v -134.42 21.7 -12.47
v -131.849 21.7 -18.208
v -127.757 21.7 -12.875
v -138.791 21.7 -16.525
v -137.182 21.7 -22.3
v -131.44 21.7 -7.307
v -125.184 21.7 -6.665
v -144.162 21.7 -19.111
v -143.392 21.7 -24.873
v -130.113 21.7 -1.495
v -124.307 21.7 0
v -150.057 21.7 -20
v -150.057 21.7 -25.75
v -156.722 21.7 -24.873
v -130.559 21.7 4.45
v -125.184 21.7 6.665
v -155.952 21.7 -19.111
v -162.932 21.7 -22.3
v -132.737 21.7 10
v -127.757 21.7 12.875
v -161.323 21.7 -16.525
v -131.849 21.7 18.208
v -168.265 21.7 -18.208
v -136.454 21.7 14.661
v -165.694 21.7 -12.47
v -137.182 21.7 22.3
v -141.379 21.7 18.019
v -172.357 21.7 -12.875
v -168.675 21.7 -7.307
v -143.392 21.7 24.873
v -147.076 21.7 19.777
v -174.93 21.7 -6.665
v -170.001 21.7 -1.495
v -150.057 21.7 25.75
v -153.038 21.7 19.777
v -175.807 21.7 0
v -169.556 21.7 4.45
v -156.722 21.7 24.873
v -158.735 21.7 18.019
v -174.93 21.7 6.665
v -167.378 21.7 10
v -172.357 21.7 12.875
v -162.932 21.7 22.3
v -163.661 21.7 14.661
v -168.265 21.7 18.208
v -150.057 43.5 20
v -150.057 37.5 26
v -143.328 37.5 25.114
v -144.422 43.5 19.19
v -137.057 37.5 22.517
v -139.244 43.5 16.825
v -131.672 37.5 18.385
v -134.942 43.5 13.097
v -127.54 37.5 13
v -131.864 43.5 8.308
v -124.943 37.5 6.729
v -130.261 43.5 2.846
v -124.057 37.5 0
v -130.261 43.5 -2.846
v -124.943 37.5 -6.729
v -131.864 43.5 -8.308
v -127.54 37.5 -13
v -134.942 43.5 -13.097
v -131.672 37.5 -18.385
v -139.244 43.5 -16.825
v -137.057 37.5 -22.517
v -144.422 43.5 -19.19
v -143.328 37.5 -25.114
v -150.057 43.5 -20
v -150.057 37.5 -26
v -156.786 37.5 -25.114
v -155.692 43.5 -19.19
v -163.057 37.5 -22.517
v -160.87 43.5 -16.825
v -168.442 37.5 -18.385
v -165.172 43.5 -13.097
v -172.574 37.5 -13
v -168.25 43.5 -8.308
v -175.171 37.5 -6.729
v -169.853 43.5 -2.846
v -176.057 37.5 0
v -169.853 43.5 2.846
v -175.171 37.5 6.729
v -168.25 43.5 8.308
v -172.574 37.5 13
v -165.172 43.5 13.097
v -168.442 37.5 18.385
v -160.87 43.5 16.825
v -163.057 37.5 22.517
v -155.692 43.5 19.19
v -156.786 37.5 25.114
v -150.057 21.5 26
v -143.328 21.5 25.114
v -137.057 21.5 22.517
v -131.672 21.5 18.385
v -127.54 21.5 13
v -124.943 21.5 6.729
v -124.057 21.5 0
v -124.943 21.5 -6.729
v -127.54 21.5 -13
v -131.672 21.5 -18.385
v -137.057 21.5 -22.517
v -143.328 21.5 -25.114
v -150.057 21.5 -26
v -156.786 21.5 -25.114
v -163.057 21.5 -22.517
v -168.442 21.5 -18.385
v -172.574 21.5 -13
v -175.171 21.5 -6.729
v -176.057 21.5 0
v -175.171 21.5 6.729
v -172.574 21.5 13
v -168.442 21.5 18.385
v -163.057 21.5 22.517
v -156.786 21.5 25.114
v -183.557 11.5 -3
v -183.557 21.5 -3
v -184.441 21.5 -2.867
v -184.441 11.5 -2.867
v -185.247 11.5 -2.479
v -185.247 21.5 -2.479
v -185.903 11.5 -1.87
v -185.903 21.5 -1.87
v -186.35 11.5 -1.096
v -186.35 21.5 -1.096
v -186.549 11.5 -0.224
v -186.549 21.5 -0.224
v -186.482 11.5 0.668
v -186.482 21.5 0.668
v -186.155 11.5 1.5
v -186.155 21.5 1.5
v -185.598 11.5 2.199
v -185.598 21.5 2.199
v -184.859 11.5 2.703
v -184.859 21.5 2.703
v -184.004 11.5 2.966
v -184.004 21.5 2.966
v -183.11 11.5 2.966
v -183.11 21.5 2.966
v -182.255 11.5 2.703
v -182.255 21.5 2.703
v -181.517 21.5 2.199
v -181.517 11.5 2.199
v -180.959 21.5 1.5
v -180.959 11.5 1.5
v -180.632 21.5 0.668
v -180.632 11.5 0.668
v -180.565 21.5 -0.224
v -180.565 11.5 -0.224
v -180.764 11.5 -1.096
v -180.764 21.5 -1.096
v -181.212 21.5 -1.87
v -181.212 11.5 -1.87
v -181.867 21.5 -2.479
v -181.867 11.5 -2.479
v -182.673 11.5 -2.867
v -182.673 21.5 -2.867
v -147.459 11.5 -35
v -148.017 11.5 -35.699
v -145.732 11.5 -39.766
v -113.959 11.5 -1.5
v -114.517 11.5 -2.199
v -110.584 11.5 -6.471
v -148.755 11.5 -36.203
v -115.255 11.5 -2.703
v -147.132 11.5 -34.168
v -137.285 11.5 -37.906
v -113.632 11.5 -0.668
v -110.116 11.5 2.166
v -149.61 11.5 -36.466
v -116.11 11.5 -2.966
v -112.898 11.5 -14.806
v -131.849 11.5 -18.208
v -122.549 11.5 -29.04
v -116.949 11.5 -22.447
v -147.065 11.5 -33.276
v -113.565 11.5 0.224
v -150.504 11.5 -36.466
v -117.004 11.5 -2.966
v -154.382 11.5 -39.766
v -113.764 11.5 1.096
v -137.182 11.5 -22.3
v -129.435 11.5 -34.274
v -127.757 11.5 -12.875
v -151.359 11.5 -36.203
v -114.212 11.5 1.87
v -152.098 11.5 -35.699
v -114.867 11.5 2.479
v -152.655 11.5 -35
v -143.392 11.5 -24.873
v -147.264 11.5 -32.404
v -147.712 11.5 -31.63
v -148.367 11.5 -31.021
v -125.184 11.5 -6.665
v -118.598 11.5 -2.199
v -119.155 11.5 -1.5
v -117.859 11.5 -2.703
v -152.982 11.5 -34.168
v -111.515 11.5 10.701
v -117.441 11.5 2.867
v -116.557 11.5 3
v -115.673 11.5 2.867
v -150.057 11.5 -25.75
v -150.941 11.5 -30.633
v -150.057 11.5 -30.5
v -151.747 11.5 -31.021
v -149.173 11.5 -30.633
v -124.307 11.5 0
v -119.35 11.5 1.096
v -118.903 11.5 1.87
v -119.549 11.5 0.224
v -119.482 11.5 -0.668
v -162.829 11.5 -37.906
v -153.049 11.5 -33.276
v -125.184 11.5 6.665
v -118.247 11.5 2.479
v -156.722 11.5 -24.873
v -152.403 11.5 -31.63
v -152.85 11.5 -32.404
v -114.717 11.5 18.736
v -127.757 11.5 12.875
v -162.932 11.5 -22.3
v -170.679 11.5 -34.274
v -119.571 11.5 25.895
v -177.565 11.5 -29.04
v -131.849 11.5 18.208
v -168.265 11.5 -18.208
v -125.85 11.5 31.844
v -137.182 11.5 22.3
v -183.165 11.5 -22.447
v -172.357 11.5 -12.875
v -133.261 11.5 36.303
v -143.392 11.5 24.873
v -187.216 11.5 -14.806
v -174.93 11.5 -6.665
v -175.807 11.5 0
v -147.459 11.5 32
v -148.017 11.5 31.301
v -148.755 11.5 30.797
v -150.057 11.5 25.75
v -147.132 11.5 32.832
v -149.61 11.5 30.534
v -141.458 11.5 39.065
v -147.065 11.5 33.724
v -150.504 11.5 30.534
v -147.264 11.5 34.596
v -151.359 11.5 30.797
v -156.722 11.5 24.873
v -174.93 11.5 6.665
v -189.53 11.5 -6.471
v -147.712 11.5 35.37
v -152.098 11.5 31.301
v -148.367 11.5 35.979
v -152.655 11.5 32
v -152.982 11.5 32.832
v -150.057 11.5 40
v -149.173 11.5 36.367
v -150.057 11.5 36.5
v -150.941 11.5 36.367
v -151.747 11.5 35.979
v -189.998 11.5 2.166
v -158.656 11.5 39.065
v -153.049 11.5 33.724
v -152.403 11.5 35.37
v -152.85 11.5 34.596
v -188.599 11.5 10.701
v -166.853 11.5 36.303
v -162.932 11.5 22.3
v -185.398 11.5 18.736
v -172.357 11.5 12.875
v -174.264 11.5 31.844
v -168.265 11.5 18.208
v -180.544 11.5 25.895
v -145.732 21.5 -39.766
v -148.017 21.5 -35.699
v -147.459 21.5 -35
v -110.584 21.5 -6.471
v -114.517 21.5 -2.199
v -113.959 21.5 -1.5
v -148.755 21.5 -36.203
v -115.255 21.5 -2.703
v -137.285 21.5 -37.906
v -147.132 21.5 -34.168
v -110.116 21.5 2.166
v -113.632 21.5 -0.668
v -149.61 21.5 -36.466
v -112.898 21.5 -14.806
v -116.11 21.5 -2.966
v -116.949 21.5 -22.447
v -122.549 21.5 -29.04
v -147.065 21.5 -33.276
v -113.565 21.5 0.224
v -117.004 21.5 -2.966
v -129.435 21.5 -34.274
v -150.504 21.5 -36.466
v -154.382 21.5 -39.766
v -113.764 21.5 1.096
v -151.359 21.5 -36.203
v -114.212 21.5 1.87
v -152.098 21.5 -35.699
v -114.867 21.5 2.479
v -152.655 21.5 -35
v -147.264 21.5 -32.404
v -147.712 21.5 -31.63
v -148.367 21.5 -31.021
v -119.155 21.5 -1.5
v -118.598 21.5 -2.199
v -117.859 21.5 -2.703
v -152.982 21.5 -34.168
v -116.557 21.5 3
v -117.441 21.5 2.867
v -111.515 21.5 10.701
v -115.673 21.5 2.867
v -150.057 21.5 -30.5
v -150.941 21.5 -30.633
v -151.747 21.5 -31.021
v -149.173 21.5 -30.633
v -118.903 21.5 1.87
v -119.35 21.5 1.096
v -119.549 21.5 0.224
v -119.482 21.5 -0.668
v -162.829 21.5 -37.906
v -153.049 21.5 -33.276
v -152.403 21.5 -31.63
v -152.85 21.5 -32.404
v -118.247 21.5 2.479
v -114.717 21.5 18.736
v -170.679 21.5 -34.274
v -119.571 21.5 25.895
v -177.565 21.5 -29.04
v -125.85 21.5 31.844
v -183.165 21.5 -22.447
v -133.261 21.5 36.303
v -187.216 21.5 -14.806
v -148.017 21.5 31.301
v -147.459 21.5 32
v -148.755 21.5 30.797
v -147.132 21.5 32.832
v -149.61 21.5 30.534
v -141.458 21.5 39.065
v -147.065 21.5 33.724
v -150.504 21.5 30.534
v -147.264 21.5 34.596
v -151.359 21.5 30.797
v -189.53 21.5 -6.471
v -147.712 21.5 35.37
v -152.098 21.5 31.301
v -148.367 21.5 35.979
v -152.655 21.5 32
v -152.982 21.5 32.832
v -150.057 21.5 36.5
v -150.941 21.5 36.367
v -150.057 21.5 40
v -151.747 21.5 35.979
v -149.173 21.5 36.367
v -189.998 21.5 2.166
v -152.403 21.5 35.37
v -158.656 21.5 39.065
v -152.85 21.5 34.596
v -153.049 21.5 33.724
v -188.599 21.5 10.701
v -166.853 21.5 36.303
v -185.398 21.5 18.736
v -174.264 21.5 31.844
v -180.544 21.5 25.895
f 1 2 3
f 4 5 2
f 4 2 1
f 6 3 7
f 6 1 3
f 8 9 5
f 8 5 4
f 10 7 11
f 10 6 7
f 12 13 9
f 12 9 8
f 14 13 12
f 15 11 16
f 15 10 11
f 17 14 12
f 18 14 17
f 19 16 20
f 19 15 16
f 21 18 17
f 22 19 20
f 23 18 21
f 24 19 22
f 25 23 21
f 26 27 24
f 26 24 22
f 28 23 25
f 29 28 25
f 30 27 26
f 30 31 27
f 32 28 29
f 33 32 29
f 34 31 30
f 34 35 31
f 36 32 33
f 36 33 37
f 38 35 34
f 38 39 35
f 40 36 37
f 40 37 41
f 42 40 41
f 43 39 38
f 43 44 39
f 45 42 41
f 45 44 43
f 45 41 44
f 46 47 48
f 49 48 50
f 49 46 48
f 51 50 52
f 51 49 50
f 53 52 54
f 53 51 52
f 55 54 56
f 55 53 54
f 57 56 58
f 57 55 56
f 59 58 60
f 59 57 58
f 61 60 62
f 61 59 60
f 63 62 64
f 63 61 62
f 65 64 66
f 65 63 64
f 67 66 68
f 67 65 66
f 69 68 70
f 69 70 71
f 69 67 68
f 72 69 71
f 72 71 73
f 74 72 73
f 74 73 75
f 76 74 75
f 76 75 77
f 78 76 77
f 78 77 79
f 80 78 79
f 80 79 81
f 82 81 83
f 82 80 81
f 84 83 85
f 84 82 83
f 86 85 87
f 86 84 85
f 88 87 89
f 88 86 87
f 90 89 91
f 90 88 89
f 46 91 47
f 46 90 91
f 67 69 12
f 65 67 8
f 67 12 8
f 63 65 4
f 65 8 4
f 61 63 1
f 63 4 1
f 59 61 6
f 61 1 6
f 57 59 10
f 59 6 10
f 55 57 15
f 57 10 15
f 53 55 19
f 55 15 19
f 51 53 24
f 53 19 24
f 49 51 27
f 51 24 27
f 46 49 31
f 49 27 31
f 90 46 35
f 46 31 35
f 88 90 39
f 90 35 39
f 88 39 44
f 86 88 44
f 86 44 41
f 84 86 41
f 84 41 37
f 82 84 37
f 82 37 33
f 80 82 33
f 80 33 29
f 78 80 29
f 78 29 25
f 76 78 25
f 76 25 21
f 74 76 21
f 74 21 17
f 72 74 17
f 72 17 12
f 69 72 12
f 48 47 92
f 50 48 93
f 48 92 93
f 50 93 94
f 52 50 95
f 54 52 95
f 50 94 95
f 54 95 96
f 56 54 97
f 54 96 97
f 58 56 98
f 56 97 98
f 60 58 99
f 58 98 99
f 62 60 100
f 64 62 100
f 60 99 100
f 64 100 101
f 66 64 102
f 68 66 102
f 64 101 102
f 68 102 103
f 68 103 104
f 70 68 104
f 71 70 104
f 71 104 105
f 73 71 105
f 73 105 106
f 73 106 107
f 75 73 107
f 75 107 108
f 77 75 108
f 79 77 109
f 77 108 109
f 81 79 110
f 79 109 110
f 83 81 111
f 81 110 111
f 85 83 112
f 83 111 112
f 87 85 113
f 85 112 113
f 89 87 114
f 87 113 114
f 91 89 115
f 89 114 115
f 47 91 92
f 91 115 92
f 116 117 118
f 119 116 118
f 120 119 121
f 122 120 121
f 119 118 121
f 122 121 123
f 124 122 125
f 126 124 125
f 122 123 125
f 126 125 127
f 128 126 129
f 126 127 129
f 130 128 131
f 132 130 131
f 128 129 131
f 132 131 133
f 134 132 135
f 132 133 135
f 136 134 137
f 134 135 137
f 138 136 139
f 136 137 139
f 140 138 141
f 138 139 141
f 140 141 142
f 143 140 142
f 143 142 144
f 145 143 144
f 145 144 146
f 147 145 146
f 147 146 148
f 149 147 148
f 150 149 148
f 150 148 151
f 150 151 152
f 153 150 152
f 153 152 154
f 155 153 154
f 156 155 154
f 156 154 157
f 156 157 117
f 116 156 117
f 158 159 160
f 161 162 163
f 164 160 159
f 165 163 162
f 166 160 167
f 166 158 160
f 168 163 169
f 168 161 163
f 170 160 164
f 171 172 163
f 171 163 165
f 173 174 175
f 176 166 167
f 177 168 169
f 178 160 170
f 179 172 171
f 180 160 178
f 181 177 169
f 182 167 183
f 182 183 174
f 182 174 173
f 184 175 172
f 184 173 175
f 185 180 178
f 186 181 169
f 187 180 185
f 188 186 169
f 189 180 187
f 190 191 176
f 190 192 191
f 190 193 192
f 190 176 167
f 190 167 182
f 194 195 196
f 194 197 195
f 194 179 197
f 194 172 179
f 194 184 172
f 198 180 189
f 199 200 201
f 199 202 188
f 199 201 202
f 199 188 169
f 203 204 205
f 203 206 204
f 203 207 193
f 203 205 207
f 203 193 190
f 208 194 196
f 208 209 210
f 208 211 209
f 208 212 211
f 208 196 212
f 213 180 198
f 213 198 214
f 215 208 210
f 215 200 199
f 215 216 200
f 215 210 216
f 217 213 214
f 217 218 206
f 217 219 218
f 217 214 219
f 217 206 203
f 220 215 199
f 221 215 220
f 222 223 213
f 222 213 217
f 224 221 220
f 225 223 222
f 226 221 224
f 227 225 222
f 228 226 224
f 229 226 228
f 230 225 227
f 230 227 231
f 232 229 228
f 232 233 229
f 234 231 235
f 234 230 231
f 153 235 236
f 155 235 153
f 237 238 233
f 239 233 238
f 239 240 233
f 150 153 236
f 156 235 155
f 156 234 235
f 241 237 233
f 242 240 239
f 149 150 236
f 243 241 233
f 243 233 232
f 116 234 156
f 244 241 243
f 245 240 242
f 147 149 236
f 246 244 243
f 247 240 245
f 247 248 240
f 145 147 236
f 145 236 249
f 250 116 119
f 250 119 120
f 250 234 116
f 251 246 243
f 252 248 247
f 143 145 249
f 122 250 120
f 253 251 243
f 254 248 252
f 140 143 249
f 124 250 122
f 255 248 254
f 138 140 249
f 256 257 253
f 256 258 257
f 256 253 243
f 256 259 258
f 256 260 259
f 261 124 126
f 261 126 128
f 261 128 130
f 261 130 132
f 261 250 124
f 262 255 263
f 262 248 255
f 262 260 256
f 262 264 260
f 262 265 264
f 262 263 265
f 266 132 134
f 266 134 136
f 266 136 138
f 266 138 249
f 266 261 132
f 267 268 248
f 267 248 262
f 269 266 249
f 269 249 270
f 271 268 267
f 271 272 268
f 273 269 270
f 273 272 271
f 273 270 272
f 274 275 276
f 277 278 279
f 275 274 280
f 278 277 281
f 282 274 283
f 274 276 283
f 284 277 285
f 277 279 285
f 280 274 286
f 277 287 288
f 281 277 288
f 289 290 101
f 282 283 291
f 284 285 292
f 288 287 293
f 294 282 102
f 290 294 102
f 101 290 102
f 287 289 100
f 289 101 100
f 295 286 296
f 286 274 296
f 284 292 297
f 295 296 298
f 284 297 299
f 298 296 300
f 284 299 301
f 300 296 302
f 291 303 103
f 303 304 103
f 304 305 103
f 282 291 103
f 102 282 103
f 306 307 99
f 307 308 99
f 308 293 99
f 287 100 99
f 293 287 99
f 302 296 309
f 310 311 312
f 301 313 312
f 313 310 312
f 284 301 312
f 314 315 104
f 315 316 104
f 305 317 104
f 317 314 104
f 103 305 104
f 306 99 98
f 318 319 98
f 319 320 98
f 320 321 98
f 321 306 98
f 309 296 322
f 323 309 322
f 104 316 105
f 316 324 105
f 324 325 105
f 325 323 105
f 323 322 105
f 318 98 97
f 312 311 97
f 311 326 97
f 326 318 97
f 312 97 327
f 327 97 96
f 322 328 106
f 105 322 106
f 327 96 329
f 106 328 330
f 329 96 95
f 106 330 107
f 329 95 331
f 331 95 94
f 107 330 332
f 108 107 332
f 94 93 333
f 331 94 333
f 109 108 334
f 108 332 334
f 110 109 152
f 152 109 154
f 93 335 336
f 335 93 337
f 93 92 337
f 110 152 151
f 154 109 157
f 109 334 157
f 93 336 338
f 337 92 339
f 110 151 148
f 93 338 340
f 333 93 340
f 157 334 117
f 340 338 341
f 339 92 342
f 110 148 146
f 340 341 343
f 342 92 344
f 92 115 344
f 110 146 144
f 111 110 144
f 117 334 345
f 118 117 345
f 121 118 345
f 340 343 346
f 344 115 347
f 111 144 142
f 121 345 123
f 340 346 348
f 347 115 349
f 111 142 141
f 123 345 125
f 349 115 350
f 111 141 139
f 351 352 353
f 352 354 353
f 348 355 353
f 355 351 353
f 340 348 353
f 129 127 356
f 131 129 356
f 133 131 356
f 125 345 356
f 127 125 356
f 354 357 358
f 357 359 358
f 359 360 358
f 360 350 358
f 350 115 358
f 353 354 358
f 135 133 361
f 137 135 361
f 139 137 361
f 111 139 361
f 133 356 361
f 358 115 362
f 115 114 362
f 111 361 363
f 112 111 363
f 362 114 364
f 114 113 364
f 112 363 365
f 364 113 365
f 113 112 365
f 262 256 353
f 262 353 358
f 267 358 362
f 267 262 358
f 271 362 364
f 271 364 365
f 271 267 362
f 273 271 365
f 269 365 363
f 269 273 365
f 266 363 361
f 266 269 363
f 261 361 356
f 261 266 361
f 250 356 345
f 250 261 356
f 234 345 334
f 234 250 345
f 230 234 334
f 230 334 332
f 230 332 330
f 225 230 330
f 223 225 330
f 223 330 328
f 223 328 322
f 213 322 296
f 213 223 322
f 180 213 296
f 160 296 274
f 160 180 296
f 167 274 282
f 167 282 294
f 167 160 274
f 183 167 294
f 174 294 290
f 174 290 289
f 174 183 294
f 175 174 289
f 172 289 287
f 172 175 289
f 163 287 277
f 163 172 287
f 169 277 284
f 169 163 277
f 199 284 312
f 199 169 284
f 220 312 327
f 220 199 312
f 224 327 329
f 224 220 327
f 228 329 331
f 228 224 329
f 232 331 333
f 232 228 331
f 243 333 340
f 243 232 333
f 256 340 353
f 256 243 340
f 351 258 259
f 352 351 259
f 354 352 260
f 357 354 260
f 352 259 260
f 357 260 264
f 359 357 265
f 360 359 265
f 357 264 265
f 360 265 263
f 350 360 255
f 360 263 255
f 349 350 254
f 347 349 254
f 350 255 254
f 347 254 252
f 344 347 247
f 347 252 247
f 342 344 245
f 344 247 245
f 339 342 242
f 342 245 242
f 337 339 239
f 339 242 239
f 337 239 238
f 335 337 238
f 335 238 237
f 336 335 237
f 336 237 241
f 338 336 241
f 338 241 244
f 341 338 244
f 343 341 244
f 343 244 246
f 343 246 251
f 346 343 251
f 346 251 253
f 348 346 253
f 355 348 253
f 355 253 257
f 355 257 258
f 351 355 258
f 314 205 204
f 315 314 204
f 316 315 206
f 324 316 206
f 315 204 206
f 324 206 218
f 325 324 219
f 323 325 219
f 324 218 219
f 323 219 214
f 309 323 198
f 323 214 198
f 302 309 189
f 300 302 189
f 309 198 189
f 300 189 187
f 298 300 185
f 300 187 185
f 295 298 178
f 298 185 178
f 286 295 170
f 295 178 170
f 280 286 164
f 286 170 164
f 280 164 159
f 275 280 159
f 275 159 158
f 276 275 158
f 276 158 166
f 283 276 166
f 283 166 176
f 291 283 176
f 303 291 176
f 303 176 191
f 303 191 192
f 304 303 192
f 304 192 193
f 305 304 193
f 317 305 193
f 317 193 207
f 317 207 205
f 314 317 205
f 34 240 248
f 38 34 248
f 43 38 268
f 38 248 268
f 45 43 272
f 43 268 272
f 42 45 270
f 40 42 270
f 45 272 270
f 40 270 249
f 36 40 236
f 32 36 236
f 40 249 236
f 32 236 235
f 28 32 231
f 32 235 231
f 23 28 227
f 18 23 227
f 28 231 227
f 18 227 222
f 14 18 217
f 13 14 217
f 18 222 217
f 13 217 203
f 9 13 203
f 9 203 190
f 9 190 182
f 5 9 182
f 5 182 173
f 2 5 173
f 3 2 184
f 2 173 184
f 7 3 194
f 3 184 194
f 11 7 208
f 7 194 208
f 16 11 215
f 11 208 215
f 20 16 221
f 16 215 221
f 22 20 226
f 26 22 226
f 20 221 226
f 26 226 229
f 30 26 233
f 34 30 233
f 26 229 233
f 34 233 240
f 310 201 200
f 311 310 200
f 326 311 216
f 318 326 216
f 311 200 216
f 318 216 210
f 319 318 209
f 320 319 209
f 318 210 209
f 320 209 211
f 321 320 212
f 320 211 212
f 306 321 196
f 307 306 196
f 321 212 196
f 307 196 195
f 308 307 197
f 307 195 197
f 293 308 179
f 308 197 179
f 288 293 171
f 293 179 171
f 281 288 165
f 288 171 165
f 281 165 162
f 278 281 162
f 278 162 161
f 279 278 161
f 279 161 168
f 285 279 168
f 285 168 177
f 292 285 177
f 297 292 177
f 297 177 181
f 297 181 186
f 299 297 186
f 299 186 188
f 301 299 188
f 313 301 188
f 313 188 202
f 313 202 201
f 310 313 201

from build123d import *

# Parameters (mm, degrees)
SKETCH1_R           = 40
BOSS_EXTRUDE1_DEPTH = 10
SKETCH2_R           = 3
CUT_EXTRUDE1_DEPTH  = 195.477983176
SKETCH3_R           = 3
CUT_EXTRUDE2_DEPTH  = 195.477983176
SKETCH4_R           = 3
CUT_EXTRUDE3_DEPTH  = 195.477983176
SKETCH5_R           = 3
CUT_EXTRUDE4_DEPTH  = 195.477983176
SKETCH6_R           = 26
BOSS_EXTRUDE2_DEPTH = 16
SKETCH7_R           = 26
BOSS_EXTRUDE3_DEPTH = 6
BOSS_EXTRUDE3_TAPER = 45
SKETCH8_R           = 20
BOSS_EXTRUDE4_DEPTH = 14
SKETCH9_R           = 25.75
CUT_EXTRUDE5_DEPTH  = 10.2
SKETCH10_R          = 20
CUT_EXTRUDE6_DEPTH  = 198.492597178


with BuildPart() as part:
    # Sketch1 → Boss-Extrude1 (new body)
    with BuildSketch(Plane.XZ.offset(-11.5)):
        with Locations(Location((-150.057059695, 0, 0), (0, 0, 90))):
            Circle(SKETCH1_R)
    extrude(amount=-BOSS_EXTRUDE1_DEPTH)

    # Sketch2 → Cut-Extrude1 (cut, through all)
    with BuildSketch(Plane.XZ.offset(-11.5)):
        with Locations(Location((-150.057059695, -33.5, 0), (0, 0, 90))):
            Circle(SKETCH2_R)
    extrude(amount=-CUT_EXTRUDE1_DEPTH, mode=Mode.SUBTRACT)

    # Sketch3 → Cut-Extrude2 (cut, through all)
    with BuildSketch(Plane.XZ.offset(-11.5)):
        with Locations(Location((-116.557059695, 0, 0), (0, 0, 90))):
            Circle(SKETCH3_R)
    extrude(amount=-CUT_EXTRUDE2_DEPTH, mode=Mode.SUBTRACT)

    # Sketch4 → Cut-Extrude3 (cut, through all)
    with BuildSketch(Plane.XZ.offset(-11.5)):
        with Locations(Location((-150.057059695, 33.5, 0), (0, 0, 90))):
            Circle(SKETCH4_R)
    extrude(amount=-CUT_EXTRUDE3_DEPTH, mode=Mode.SUBTRACT)

    # Sketch5 → Cut-Extrude4 (cut, through all)
    with BuildSketch(Plane(origin=(0, 21.5, 0), x_dir=(-1, 0, 0), z_dir=(0, 1, 0))):
        with Locations(Location((183.557059695, 0, 0), (0, 0, 270))):
            Circle(SKETCH5_R)
    extrude(amount=-CUT_EXTRUDE4_DEPTH, mode=Mode.SUBTRACT)

    # Sketch6 → Boss-Extrude2 (add)
    with BuildSketch(Plane(origin=(0, 21.5, 0), x_dir=(-1, 0, 0), z_dir=(0, 1, 0))):
        with Locations(Location((150.057059695, 0, 0), (0, 0, 90))):
            Circle(SKETCH6_R)
    extrude(amount=BOSS_EXTRUDE2_DEPTH)

    # Sketch7 → Boss-Extrude3 (add)
    with BuildSketch(Plane(origin=(0, 37.5, 0), x_dir=(-1, 0, 0), z_dir=(0, 1, 0))):
        with Locations(Location((150.057059695, 0, 0), (0, 0, 90))):
            Circle(SKETCH7_R)
    extrude(amount=BOSS_EXTRUDE3_DEPTH, taper=BOSS_EXTRUDE3_TAPER)

    # Sketch8 → Boss-Extrude4 (add)
    with BuildSketch(Plane(origin=(0, 43.5, 0), x_dir=(-1, 0, 0), z_dir=(0, 1, 0))):
        with Locations(Location((150.057059695, 0, 0), (0, 0, 90))):
            Circle(SKETCH8_R)
    extrude(amount=BOSS_EXTRUDE4_DEPTH)

    # Sketch9 → Cut-Extrude5 (cut)
    with BuildSketch(Plane.XZ.offset(-11.5)):
        with Locations(Location((-150.057059695, 0, 0), (0, 0, 90))):
            Circle(SKETCH9_R)
    extrude(amount=-CUT_EXTRUDE5_DEPTH, mode=Mode.SUBTRACT)

    # Sketch10 → Cut-Extrude6 (cut, through all)
    with BuildSketch(Plane.XZ.offset(-21.7)):
        with Locations(Location((-150.057059695, 0, 0), (0, 0, 270))):
            Circle(SKETCH10_R)
    extrude(amount=-CUT_EXTRUDE6_DEPTH, mode=Mode.SUBTRACT)


solid = part.part
